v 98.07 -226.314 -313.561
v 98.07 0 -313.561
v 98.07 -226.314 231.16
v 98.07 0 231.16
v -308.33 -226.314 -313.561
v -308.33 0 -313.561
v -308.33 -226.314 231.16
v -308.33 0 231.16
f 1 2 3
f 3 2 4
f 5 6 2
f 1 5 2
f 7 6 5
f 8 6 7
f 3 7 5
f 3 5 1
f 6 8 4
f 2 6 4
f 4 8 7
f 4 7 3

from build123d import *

# Parameters (mm, degrees)
F0_W       = 406.4
F0_H       = 544.7211598467
F2_DEPTH   = 179.832
F3_W       = 406.4
F3_H       = 544.7211598467
F4_DEPTH   = 171.704
F6_W       = 406.4
F6_H       = 544.7211598467
F4_FACE_W  = 406.4
F4_FACE_H  = 544.7211598467
F1_W       = 406.4
F1_H       = 544.7211598467
F2_FACE1_W = 406.4
F2_FACE1_H = 544.7211598467
F7_DEPTH   = 218.186


with BuildPart() as f2:
    # F0 (on Front) → F2 (new body)
    with BuildSketch(Plane.XZ):
        with Locations((-105.1295921206, -41.2003919482)):
            Rectangle(F0_W, F0_H)
    extrude(amount=F2_DEPTH)

    # F3 (on face) → F4 (cut)
    with BuildSketch(Plane.XZ.offset(179.832)):
        with Locations((-105.1295921206, -41.2003919482)):
            Rectangle(F3_W, F3_H)
    extrude(amount=-F4_DEPTH, mode=Mode.SUBTRACT)

    # F6 (on face) + F4_face (on face) + F1 (on face) + F2_face1 (on face) → F7 (join)
    with BuildSketch(Plane.XZ):
        with Locations((-105.1295921206, -41.2003919482)):
            Rectangle(F6_W, F6_H)
    with BuildSketch(Plane(origin=(-105.1295921206, -8.128, -41.2003919482), x_dir=(1, 0, 0), z_dir=(0, -1, 0))):
        Rectangle(F4_FACE_W, F4_FACE_H)
    with BuildSketch(Plane.XZ):
        with Locations((-105.1295921206, -41.2003919482)):
            Rectangle(F1_W, F1_H)
    with BuildSketch(Plane(origin=(-105.1295921206, 0, -41.2003919482), x_dir=(1, 0, 0), z_dir=(0, 1, 0))):
        Rectangle(F2_FACE1_W, F2_FACE1_H)
    extrude(amount=F7_DEPTH, dir=(0, -1, 0))


solid = f2.part
